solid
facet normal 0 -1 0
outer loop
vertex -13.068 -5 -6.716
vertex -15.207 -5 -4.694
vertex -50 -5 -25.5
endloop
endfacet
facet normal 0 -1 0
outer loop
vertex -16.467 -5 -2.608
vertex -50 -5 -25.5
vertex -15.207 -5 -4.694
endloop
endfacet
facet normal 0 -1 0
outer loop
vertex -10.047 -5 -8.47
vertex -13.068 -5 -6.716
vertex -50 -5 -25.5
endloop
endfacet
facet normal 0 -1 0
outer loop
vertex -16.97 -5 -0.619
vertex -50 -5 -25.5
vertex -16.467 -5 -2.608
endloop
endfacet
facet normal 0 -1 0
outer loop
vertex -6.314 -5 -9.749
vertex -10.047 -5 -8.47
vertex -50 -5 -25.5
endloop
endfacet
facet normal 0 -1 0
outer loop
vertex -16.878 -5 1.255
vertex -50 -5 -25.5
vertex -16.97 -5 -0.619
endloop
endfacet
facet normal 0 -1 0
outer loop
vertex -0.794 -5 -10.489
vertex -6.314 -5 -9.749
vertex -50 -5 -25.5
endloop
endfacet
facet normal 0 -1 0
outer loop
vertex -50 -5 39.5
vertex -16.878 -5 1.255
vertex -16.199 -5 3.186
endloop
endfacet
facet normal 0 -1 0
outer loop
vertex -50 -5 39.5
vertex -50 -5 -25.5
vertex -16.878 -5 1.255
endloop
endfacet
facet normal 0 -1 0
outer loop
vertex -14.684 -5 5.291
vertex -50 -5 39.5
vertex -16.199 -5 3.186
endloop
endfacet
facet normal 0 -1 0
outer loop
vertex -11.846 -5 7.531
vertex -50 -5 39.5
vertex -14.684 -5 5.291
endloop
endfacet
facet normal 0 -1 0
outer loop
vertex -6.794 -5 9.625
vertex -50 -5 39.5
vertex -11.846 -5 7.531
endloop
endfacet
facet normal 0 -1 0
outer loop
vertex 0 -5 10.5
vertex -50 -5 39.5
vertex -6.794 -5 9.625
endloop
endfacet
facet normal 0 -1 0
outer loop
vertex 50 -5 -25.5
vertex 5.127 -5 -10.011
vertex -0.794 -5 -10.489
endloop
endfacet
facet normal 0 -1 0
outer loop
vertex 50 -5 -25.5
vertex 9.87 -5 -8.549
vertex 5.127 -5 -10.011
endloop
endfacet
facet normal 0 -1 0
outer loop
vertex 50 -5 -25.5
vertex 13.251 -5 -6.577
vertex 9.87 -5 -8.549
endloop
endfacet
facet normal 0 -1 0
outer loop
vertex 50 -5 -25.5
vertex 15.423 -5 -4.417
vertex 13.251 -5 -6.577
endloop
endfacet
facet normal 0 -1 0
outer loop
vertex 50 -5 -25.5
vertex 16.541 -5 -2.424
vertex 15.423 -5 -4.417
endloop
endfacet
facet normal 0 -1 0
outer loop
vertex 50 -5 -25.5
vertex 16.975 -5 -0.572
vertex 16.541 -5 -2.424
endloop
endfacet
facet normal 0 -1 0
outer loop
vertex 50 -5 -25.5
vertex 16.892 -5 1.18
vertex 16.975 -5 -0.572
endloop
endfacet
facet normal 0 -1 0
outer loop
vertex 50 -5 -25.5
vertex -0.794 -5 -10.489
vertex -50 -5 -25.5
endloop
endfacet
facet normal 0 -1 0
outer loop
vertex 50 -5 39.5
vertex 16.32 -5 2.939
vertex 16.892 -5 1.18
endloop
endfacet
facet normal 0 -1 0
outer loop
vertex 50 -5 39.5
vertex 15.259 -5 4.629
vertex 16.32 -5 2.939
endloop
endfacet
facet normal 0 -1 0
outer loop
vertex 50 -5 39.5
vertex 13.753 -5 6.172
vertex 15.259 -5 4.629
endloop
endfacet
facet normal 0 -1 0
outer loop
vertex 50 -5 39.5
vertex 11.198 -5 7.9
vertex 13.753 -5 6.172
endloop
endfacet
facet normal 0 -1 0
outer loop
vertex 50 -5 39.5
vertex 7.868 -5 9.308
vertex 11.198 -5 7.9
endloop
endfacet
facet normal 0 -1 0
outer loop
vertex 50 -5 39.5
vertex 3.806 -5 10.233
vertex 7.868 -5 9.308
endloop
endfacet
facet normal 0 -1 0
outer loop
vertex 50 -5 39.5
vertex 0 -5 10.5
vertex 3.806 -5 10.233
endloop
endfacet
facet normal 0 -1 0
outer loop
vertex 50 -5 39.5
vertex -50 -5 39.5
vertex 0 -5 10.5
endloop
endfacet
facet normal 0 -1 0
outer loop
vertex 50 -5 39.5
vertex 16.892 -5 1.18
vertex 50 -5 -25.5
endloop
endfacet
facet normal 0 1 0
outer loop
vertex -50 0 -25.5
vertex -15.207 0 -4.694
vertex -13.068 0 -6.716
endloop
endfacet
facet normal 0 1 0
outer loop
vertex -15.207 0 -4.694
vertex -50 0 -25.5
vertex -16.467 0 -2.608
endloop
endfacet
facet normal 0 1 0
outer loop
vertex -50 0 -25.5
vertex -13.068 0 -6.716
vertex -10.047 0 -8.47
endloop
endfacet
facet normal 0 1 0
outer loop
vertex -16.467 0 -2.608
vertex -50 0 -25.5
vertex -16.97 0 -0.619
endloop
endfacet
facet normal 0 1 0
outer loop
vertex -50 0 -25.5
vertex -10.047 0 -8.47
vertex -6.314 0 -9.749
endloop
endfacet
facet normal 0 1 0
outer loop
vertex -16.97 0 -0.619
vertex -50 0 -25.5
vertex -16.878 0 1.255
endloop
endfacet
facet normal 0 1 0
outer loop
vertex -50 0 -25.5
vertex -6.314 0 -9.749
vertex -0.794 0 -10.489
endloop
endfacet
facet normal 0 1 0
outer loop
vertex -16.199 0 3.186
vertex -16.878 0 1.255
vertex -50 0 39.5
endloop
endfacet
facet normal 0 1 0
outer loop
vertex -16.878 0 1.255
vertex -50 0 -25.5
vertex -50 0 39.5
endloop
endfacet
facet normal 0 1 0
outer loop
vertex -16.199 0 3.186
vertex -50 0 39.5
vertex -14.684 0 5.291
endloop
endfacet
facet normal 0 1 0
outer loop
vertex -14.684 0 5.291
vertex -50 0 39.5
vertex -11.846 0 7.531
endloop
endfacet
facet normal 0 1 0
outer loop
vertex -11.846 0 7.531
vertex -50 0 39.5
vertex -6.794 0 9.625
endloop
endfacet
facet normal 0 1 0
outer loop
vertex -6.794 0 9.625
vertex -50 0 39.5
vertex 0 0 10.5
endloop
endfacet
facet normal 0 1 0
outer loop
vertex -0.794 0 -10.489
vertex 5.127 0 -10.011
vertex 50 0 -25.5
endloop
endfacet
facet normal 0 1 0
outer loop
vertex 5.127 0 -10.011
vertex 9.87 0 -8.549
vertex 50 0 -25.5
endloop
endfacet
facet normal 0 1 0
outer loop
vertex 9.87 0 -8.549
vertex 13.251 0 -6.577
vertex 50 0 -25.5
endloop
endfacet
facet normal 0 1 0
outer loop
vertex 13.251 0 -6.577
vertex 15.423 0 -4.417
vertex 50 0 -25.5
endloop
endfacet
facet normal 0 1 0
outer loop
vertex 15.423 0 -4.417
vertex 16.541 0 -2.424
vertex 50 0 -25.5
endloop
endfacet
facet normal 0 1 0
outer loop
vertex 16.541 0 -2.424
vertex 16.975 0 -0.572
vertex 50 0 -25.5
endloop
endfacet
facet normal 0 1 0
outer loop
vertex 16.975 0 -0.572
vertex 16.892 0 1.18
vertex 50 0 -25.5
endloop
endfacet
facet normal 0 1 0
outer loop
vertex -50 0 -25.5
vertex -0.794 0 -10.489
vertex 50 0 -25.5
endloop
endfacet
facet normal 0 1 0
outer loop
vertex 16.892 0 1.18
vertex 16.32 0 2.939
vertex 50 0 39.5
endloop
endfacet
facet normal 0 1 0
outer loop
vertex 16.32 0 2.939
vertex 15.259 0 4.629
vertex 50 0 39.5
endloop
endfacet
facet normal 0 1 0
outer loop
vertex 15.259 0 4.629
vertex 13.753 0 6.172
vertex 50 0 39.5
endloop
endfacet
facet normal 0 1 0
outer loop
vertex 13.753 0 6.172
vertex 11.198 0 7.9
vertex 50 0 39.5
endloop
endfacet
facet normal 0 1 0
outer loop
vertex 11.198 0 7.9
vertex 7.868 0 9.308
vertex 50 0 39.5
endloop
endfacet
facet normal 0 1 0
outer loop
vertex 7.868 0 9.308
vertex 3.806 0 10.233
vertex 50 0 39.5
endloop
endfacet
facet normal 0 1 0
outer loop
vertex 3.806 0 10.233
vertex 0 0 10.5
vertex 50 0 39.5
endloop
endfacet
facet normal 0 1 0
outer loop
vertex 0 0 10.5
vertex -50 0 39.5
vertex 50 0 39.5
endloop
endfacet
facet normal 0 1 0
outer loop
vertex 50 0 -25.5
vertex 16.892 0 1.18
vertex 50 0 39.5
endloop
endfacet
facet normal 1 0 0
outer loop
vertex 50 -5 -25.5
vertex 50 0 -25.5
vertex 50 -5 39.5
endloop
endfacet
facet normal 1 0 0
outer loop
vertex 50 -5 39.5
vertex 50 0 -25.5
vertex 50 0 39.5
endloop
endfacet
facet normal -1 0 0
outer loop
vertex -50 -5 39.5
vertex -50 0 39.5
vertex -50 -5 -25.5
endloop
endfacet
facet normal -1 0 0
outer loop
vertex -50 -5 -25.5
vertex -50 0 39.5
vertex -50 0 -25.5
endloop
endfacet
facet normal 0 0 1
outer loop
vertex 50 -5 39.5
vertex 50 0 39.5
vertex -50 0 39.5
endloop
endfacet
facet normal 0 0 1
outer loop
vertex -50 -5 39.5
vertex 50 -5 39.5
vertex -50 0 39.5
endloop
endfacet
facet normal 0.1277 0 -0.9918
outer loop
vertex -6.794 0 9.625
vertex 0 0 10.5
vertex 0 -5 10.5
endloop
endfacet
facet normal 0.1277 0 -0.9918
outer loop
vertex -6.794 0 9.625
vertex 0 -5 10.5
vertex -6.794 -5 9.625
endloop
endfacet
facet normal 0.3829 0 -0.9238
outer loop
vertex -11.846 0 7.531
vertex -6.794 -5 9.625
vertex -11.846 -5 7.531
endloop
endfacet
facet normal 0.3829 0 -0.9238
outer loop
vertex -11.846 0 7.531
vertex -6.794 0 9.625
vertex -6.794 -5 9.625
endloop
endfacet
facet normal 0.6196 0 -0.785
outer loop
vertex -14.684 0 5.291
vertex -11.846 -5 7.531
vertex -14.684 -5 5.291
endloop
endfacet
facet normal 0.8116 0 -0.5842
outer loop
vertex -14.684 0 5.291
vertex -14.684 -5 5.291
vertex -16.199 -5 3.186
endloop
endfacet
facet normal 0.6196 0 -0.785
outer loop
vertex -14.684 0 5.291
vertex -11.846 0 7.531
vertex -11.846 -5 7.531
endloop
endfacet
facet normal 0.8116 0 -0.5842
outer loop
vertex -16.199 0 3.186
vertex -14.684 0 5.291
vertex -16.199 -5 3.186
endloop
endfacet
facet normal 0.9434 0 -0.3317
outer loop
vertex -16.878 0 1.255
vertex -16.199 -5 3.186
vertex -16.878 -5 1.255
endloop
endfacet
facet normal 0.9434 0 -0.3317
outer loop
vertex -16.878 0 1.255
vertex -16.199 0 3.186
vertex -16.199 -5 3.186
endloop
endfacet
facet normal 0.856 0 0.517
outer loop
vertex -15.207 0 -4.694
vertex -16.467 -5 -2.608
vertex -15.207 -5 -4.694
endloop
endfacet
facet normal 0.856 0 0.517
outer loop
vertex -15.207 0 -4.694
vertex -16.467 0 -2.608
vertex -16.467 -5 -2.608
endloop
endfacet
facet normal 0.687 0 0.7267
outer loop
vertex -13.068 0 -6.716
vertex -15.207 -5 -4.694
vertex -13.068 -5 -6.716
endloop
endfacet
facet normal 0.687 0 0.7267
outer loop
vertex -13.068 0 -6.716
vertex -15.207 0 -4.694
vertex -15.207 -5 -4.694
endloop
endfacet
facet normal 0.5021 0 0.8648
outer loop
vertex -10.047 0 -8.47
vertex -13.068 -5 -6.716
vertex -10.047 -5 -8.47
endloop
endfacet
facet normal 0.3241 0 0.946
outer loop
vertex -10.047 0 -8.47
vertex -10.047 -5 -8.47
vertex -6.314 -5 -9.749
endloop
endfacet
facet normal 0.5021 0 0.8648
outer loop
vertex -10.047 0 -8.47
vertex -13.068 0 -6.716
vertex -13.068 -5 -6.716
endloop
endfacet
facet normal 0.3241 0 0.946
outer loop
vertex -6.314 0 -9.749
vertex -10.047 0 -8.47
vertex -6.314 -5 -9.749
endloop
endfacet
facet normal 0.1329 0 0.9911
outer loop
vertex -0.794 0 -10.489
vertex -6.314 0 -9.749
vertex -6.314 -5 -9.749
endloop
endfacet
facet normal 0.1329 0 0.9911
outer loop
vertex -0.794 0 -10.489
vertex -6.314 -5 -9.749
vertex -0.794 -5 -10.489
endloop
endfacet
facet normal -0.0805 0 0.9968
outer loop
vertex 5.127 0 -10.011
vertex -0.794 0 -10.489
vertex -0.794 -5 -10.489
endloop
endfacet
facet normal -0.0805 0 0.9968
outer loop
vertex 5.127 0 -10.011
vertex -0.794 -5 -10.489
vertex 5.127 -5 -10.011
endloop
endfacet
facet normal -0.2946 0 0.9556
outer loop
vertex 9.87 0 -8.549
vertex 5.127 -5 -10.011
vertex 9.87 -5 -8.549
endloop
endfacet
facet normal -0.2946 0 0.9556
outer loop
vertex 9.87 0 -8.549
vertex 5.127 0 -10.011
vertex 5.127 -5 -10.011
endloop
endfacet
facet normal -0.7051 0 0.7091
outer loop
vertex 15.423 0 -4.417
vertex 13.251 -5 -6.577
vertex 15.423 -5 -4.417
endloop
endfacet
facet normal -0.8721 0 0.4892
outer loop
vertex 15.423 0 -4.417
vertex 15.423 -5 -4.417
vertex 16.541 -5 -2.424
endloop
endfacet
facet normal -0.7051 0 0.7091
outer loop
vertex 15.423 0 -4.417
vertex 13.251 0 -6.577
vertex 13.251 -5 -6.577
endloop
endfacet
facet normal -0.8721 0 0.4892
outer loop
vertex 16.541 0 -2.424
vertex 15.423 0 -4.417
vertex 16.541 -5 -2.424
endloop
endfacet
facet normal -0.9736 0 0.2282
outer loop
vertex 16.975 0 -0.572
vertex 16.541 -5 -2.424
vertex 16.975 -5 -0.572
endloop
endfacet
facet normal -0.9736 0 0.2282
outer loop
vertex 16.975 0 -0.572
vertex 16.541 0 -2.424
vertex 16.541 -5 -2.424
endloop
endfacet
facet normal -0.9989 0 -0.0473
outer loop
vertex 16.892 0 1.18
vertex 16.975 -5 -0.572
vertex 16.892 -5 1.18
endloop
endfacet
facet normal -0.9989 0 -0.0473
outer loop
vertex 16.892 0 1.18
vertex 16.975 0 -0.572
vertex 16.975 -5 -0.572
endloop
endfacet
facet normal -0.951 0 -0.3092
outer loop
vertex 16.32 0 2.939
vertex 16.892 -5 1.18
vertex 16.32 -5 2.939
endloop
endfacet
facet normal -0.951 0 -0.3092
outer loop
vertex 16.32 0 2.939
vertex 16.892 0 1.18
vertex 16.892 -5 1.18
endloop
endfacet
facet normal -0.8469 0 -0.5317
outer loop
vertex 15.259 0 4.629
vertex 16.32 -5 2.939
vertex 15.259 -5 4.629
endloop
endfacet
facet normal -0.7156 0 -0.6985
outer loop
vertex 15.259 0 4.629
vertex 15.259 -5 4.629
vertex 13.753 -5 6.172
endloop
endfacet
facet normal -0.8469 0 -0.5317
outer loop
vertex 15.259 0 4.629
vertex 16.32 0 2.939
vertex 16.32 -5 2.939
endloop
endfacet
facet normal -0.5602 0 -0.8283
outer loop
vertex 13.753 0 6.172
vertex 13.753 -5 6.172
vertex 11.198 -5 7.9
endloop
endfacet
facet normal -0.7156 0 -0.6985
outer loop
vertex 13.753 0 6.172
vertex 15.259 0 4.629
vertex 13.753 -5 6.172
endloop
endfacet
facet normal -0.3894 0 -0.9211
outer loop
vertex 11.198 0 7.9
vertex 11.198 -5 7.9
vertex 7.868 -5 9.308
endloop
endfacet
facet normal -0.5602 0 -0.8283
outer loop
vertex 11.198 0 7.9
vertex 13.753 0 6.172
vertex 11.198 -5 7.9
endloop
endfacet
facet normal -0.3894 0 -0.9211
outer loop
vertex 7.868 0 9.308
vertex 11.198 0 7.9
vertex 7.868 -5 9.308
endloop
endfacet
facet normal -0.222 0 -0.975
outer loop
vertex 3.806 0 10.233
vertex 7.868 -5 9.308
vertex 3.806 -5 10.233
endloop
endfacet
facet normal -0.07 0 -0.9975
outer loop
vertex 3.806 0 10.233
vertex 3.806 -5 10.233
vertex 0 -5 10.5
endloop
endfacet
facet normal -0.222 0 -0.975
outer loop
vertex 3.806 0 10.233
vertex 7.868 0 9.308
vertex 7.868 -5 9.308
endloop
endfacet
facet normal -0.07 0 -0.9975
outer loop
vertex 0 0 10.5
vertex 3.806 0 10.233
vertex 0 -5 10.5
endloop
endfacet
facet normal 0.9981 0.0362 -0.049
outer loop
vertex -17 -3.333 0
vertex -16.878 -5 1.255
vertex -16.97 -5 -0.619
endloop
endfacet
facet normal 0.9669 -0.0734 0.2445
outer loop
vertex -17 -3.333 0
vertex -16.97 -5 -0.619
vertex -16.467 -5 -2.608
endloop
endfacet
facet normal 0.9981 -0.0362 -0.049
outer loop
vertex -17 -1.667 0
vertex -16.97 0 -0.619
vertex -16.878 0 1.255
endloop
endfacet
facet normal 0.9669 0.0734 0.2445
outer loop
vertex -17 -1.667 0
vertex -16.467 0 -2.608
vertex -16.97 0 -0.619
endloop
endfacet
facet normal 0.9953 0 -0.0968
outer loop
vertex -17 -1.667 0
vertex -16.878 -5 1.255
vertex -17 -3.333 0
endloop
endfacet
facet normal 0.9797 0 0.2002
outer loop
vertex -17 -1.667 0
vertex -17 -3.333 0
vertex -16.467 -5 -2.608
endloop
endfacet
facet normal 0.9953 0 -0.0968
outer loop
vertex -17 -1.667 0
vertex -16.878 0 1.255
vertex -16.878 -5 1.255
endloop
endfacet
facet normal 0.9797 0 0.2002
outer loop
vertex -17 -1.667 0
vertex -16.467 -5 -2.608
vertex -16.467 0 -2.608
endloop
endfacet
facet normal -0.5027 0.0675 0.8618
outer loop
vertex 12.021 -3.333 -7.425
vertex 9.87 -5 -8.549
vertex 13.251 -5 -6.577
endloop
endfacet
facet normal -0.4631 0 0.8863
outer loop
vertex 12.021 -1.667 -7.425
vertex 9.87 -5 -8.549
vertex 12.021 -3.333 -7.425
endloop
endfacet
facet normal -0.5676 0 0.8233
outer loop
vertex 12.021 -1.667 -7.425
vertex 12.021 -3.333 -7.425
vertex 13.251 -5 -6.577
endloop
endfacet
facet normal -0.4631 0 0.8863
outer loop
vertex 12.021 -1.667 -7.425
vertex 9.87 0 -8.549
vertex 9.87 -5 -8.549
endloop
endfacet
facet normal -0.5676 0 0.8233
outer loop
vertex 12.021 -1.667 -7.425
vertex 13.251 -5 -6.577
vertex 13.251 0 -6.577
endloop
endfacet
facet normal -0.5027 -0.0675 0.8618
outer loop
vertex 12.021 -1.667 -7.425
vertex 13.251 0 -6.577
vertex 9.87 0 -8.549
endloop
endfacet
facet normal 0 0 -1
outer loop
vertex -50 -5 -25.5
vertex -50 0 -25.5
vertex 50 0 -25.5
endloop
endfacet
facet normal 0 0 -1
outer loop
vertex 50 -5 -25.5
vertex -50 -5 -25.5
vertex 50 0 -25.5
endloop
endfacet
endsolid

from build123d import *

# Parameters (mm, degrees)
F1_DEPTH = 5


# Not quite as in the source:
# - a feature names something its author has since deleted; it is built from what else it names


with BuildPart() as f1:
    # F0 (on Front) → F1 (new body)
    with BuildSketch(Plane.XZ):
        Polygon((50, 39.5), (0, 39.5), (-50, 39.5), (-50, -25.5), (50, -25.5), align=None)
        with BuildLine():
            add(Edge.make_bspline(
                [(-17, 0), (-17, -25.3492424049), (12.0208152802, -7.4246212025), (41.0416305603, 10.5), (0, 10.5)],
                knots=[0, 0, 0, 2.3561944902, 2.3561944902, 4.7123889804, 4.7123889804, 4.7123889804], degree=2, weights=[1, 0.3826834324, 1, 0.3826834324, 1]))
            add(Edge.make_bspline(
                [(0, 10.5), (-17, 10.5), (-17, 0)],
                knots=[4.7123889804, 4.7123889804, 4.7123889804, 6.2831853072, 6.2831853072, 6.2831853072], degree=2, weights=[1, 0.7071067812, 1]))
        make_face(mode=Mode.SUBTRACT)
    extrude(amount=F1_DEPTH)


solid = f1.part
